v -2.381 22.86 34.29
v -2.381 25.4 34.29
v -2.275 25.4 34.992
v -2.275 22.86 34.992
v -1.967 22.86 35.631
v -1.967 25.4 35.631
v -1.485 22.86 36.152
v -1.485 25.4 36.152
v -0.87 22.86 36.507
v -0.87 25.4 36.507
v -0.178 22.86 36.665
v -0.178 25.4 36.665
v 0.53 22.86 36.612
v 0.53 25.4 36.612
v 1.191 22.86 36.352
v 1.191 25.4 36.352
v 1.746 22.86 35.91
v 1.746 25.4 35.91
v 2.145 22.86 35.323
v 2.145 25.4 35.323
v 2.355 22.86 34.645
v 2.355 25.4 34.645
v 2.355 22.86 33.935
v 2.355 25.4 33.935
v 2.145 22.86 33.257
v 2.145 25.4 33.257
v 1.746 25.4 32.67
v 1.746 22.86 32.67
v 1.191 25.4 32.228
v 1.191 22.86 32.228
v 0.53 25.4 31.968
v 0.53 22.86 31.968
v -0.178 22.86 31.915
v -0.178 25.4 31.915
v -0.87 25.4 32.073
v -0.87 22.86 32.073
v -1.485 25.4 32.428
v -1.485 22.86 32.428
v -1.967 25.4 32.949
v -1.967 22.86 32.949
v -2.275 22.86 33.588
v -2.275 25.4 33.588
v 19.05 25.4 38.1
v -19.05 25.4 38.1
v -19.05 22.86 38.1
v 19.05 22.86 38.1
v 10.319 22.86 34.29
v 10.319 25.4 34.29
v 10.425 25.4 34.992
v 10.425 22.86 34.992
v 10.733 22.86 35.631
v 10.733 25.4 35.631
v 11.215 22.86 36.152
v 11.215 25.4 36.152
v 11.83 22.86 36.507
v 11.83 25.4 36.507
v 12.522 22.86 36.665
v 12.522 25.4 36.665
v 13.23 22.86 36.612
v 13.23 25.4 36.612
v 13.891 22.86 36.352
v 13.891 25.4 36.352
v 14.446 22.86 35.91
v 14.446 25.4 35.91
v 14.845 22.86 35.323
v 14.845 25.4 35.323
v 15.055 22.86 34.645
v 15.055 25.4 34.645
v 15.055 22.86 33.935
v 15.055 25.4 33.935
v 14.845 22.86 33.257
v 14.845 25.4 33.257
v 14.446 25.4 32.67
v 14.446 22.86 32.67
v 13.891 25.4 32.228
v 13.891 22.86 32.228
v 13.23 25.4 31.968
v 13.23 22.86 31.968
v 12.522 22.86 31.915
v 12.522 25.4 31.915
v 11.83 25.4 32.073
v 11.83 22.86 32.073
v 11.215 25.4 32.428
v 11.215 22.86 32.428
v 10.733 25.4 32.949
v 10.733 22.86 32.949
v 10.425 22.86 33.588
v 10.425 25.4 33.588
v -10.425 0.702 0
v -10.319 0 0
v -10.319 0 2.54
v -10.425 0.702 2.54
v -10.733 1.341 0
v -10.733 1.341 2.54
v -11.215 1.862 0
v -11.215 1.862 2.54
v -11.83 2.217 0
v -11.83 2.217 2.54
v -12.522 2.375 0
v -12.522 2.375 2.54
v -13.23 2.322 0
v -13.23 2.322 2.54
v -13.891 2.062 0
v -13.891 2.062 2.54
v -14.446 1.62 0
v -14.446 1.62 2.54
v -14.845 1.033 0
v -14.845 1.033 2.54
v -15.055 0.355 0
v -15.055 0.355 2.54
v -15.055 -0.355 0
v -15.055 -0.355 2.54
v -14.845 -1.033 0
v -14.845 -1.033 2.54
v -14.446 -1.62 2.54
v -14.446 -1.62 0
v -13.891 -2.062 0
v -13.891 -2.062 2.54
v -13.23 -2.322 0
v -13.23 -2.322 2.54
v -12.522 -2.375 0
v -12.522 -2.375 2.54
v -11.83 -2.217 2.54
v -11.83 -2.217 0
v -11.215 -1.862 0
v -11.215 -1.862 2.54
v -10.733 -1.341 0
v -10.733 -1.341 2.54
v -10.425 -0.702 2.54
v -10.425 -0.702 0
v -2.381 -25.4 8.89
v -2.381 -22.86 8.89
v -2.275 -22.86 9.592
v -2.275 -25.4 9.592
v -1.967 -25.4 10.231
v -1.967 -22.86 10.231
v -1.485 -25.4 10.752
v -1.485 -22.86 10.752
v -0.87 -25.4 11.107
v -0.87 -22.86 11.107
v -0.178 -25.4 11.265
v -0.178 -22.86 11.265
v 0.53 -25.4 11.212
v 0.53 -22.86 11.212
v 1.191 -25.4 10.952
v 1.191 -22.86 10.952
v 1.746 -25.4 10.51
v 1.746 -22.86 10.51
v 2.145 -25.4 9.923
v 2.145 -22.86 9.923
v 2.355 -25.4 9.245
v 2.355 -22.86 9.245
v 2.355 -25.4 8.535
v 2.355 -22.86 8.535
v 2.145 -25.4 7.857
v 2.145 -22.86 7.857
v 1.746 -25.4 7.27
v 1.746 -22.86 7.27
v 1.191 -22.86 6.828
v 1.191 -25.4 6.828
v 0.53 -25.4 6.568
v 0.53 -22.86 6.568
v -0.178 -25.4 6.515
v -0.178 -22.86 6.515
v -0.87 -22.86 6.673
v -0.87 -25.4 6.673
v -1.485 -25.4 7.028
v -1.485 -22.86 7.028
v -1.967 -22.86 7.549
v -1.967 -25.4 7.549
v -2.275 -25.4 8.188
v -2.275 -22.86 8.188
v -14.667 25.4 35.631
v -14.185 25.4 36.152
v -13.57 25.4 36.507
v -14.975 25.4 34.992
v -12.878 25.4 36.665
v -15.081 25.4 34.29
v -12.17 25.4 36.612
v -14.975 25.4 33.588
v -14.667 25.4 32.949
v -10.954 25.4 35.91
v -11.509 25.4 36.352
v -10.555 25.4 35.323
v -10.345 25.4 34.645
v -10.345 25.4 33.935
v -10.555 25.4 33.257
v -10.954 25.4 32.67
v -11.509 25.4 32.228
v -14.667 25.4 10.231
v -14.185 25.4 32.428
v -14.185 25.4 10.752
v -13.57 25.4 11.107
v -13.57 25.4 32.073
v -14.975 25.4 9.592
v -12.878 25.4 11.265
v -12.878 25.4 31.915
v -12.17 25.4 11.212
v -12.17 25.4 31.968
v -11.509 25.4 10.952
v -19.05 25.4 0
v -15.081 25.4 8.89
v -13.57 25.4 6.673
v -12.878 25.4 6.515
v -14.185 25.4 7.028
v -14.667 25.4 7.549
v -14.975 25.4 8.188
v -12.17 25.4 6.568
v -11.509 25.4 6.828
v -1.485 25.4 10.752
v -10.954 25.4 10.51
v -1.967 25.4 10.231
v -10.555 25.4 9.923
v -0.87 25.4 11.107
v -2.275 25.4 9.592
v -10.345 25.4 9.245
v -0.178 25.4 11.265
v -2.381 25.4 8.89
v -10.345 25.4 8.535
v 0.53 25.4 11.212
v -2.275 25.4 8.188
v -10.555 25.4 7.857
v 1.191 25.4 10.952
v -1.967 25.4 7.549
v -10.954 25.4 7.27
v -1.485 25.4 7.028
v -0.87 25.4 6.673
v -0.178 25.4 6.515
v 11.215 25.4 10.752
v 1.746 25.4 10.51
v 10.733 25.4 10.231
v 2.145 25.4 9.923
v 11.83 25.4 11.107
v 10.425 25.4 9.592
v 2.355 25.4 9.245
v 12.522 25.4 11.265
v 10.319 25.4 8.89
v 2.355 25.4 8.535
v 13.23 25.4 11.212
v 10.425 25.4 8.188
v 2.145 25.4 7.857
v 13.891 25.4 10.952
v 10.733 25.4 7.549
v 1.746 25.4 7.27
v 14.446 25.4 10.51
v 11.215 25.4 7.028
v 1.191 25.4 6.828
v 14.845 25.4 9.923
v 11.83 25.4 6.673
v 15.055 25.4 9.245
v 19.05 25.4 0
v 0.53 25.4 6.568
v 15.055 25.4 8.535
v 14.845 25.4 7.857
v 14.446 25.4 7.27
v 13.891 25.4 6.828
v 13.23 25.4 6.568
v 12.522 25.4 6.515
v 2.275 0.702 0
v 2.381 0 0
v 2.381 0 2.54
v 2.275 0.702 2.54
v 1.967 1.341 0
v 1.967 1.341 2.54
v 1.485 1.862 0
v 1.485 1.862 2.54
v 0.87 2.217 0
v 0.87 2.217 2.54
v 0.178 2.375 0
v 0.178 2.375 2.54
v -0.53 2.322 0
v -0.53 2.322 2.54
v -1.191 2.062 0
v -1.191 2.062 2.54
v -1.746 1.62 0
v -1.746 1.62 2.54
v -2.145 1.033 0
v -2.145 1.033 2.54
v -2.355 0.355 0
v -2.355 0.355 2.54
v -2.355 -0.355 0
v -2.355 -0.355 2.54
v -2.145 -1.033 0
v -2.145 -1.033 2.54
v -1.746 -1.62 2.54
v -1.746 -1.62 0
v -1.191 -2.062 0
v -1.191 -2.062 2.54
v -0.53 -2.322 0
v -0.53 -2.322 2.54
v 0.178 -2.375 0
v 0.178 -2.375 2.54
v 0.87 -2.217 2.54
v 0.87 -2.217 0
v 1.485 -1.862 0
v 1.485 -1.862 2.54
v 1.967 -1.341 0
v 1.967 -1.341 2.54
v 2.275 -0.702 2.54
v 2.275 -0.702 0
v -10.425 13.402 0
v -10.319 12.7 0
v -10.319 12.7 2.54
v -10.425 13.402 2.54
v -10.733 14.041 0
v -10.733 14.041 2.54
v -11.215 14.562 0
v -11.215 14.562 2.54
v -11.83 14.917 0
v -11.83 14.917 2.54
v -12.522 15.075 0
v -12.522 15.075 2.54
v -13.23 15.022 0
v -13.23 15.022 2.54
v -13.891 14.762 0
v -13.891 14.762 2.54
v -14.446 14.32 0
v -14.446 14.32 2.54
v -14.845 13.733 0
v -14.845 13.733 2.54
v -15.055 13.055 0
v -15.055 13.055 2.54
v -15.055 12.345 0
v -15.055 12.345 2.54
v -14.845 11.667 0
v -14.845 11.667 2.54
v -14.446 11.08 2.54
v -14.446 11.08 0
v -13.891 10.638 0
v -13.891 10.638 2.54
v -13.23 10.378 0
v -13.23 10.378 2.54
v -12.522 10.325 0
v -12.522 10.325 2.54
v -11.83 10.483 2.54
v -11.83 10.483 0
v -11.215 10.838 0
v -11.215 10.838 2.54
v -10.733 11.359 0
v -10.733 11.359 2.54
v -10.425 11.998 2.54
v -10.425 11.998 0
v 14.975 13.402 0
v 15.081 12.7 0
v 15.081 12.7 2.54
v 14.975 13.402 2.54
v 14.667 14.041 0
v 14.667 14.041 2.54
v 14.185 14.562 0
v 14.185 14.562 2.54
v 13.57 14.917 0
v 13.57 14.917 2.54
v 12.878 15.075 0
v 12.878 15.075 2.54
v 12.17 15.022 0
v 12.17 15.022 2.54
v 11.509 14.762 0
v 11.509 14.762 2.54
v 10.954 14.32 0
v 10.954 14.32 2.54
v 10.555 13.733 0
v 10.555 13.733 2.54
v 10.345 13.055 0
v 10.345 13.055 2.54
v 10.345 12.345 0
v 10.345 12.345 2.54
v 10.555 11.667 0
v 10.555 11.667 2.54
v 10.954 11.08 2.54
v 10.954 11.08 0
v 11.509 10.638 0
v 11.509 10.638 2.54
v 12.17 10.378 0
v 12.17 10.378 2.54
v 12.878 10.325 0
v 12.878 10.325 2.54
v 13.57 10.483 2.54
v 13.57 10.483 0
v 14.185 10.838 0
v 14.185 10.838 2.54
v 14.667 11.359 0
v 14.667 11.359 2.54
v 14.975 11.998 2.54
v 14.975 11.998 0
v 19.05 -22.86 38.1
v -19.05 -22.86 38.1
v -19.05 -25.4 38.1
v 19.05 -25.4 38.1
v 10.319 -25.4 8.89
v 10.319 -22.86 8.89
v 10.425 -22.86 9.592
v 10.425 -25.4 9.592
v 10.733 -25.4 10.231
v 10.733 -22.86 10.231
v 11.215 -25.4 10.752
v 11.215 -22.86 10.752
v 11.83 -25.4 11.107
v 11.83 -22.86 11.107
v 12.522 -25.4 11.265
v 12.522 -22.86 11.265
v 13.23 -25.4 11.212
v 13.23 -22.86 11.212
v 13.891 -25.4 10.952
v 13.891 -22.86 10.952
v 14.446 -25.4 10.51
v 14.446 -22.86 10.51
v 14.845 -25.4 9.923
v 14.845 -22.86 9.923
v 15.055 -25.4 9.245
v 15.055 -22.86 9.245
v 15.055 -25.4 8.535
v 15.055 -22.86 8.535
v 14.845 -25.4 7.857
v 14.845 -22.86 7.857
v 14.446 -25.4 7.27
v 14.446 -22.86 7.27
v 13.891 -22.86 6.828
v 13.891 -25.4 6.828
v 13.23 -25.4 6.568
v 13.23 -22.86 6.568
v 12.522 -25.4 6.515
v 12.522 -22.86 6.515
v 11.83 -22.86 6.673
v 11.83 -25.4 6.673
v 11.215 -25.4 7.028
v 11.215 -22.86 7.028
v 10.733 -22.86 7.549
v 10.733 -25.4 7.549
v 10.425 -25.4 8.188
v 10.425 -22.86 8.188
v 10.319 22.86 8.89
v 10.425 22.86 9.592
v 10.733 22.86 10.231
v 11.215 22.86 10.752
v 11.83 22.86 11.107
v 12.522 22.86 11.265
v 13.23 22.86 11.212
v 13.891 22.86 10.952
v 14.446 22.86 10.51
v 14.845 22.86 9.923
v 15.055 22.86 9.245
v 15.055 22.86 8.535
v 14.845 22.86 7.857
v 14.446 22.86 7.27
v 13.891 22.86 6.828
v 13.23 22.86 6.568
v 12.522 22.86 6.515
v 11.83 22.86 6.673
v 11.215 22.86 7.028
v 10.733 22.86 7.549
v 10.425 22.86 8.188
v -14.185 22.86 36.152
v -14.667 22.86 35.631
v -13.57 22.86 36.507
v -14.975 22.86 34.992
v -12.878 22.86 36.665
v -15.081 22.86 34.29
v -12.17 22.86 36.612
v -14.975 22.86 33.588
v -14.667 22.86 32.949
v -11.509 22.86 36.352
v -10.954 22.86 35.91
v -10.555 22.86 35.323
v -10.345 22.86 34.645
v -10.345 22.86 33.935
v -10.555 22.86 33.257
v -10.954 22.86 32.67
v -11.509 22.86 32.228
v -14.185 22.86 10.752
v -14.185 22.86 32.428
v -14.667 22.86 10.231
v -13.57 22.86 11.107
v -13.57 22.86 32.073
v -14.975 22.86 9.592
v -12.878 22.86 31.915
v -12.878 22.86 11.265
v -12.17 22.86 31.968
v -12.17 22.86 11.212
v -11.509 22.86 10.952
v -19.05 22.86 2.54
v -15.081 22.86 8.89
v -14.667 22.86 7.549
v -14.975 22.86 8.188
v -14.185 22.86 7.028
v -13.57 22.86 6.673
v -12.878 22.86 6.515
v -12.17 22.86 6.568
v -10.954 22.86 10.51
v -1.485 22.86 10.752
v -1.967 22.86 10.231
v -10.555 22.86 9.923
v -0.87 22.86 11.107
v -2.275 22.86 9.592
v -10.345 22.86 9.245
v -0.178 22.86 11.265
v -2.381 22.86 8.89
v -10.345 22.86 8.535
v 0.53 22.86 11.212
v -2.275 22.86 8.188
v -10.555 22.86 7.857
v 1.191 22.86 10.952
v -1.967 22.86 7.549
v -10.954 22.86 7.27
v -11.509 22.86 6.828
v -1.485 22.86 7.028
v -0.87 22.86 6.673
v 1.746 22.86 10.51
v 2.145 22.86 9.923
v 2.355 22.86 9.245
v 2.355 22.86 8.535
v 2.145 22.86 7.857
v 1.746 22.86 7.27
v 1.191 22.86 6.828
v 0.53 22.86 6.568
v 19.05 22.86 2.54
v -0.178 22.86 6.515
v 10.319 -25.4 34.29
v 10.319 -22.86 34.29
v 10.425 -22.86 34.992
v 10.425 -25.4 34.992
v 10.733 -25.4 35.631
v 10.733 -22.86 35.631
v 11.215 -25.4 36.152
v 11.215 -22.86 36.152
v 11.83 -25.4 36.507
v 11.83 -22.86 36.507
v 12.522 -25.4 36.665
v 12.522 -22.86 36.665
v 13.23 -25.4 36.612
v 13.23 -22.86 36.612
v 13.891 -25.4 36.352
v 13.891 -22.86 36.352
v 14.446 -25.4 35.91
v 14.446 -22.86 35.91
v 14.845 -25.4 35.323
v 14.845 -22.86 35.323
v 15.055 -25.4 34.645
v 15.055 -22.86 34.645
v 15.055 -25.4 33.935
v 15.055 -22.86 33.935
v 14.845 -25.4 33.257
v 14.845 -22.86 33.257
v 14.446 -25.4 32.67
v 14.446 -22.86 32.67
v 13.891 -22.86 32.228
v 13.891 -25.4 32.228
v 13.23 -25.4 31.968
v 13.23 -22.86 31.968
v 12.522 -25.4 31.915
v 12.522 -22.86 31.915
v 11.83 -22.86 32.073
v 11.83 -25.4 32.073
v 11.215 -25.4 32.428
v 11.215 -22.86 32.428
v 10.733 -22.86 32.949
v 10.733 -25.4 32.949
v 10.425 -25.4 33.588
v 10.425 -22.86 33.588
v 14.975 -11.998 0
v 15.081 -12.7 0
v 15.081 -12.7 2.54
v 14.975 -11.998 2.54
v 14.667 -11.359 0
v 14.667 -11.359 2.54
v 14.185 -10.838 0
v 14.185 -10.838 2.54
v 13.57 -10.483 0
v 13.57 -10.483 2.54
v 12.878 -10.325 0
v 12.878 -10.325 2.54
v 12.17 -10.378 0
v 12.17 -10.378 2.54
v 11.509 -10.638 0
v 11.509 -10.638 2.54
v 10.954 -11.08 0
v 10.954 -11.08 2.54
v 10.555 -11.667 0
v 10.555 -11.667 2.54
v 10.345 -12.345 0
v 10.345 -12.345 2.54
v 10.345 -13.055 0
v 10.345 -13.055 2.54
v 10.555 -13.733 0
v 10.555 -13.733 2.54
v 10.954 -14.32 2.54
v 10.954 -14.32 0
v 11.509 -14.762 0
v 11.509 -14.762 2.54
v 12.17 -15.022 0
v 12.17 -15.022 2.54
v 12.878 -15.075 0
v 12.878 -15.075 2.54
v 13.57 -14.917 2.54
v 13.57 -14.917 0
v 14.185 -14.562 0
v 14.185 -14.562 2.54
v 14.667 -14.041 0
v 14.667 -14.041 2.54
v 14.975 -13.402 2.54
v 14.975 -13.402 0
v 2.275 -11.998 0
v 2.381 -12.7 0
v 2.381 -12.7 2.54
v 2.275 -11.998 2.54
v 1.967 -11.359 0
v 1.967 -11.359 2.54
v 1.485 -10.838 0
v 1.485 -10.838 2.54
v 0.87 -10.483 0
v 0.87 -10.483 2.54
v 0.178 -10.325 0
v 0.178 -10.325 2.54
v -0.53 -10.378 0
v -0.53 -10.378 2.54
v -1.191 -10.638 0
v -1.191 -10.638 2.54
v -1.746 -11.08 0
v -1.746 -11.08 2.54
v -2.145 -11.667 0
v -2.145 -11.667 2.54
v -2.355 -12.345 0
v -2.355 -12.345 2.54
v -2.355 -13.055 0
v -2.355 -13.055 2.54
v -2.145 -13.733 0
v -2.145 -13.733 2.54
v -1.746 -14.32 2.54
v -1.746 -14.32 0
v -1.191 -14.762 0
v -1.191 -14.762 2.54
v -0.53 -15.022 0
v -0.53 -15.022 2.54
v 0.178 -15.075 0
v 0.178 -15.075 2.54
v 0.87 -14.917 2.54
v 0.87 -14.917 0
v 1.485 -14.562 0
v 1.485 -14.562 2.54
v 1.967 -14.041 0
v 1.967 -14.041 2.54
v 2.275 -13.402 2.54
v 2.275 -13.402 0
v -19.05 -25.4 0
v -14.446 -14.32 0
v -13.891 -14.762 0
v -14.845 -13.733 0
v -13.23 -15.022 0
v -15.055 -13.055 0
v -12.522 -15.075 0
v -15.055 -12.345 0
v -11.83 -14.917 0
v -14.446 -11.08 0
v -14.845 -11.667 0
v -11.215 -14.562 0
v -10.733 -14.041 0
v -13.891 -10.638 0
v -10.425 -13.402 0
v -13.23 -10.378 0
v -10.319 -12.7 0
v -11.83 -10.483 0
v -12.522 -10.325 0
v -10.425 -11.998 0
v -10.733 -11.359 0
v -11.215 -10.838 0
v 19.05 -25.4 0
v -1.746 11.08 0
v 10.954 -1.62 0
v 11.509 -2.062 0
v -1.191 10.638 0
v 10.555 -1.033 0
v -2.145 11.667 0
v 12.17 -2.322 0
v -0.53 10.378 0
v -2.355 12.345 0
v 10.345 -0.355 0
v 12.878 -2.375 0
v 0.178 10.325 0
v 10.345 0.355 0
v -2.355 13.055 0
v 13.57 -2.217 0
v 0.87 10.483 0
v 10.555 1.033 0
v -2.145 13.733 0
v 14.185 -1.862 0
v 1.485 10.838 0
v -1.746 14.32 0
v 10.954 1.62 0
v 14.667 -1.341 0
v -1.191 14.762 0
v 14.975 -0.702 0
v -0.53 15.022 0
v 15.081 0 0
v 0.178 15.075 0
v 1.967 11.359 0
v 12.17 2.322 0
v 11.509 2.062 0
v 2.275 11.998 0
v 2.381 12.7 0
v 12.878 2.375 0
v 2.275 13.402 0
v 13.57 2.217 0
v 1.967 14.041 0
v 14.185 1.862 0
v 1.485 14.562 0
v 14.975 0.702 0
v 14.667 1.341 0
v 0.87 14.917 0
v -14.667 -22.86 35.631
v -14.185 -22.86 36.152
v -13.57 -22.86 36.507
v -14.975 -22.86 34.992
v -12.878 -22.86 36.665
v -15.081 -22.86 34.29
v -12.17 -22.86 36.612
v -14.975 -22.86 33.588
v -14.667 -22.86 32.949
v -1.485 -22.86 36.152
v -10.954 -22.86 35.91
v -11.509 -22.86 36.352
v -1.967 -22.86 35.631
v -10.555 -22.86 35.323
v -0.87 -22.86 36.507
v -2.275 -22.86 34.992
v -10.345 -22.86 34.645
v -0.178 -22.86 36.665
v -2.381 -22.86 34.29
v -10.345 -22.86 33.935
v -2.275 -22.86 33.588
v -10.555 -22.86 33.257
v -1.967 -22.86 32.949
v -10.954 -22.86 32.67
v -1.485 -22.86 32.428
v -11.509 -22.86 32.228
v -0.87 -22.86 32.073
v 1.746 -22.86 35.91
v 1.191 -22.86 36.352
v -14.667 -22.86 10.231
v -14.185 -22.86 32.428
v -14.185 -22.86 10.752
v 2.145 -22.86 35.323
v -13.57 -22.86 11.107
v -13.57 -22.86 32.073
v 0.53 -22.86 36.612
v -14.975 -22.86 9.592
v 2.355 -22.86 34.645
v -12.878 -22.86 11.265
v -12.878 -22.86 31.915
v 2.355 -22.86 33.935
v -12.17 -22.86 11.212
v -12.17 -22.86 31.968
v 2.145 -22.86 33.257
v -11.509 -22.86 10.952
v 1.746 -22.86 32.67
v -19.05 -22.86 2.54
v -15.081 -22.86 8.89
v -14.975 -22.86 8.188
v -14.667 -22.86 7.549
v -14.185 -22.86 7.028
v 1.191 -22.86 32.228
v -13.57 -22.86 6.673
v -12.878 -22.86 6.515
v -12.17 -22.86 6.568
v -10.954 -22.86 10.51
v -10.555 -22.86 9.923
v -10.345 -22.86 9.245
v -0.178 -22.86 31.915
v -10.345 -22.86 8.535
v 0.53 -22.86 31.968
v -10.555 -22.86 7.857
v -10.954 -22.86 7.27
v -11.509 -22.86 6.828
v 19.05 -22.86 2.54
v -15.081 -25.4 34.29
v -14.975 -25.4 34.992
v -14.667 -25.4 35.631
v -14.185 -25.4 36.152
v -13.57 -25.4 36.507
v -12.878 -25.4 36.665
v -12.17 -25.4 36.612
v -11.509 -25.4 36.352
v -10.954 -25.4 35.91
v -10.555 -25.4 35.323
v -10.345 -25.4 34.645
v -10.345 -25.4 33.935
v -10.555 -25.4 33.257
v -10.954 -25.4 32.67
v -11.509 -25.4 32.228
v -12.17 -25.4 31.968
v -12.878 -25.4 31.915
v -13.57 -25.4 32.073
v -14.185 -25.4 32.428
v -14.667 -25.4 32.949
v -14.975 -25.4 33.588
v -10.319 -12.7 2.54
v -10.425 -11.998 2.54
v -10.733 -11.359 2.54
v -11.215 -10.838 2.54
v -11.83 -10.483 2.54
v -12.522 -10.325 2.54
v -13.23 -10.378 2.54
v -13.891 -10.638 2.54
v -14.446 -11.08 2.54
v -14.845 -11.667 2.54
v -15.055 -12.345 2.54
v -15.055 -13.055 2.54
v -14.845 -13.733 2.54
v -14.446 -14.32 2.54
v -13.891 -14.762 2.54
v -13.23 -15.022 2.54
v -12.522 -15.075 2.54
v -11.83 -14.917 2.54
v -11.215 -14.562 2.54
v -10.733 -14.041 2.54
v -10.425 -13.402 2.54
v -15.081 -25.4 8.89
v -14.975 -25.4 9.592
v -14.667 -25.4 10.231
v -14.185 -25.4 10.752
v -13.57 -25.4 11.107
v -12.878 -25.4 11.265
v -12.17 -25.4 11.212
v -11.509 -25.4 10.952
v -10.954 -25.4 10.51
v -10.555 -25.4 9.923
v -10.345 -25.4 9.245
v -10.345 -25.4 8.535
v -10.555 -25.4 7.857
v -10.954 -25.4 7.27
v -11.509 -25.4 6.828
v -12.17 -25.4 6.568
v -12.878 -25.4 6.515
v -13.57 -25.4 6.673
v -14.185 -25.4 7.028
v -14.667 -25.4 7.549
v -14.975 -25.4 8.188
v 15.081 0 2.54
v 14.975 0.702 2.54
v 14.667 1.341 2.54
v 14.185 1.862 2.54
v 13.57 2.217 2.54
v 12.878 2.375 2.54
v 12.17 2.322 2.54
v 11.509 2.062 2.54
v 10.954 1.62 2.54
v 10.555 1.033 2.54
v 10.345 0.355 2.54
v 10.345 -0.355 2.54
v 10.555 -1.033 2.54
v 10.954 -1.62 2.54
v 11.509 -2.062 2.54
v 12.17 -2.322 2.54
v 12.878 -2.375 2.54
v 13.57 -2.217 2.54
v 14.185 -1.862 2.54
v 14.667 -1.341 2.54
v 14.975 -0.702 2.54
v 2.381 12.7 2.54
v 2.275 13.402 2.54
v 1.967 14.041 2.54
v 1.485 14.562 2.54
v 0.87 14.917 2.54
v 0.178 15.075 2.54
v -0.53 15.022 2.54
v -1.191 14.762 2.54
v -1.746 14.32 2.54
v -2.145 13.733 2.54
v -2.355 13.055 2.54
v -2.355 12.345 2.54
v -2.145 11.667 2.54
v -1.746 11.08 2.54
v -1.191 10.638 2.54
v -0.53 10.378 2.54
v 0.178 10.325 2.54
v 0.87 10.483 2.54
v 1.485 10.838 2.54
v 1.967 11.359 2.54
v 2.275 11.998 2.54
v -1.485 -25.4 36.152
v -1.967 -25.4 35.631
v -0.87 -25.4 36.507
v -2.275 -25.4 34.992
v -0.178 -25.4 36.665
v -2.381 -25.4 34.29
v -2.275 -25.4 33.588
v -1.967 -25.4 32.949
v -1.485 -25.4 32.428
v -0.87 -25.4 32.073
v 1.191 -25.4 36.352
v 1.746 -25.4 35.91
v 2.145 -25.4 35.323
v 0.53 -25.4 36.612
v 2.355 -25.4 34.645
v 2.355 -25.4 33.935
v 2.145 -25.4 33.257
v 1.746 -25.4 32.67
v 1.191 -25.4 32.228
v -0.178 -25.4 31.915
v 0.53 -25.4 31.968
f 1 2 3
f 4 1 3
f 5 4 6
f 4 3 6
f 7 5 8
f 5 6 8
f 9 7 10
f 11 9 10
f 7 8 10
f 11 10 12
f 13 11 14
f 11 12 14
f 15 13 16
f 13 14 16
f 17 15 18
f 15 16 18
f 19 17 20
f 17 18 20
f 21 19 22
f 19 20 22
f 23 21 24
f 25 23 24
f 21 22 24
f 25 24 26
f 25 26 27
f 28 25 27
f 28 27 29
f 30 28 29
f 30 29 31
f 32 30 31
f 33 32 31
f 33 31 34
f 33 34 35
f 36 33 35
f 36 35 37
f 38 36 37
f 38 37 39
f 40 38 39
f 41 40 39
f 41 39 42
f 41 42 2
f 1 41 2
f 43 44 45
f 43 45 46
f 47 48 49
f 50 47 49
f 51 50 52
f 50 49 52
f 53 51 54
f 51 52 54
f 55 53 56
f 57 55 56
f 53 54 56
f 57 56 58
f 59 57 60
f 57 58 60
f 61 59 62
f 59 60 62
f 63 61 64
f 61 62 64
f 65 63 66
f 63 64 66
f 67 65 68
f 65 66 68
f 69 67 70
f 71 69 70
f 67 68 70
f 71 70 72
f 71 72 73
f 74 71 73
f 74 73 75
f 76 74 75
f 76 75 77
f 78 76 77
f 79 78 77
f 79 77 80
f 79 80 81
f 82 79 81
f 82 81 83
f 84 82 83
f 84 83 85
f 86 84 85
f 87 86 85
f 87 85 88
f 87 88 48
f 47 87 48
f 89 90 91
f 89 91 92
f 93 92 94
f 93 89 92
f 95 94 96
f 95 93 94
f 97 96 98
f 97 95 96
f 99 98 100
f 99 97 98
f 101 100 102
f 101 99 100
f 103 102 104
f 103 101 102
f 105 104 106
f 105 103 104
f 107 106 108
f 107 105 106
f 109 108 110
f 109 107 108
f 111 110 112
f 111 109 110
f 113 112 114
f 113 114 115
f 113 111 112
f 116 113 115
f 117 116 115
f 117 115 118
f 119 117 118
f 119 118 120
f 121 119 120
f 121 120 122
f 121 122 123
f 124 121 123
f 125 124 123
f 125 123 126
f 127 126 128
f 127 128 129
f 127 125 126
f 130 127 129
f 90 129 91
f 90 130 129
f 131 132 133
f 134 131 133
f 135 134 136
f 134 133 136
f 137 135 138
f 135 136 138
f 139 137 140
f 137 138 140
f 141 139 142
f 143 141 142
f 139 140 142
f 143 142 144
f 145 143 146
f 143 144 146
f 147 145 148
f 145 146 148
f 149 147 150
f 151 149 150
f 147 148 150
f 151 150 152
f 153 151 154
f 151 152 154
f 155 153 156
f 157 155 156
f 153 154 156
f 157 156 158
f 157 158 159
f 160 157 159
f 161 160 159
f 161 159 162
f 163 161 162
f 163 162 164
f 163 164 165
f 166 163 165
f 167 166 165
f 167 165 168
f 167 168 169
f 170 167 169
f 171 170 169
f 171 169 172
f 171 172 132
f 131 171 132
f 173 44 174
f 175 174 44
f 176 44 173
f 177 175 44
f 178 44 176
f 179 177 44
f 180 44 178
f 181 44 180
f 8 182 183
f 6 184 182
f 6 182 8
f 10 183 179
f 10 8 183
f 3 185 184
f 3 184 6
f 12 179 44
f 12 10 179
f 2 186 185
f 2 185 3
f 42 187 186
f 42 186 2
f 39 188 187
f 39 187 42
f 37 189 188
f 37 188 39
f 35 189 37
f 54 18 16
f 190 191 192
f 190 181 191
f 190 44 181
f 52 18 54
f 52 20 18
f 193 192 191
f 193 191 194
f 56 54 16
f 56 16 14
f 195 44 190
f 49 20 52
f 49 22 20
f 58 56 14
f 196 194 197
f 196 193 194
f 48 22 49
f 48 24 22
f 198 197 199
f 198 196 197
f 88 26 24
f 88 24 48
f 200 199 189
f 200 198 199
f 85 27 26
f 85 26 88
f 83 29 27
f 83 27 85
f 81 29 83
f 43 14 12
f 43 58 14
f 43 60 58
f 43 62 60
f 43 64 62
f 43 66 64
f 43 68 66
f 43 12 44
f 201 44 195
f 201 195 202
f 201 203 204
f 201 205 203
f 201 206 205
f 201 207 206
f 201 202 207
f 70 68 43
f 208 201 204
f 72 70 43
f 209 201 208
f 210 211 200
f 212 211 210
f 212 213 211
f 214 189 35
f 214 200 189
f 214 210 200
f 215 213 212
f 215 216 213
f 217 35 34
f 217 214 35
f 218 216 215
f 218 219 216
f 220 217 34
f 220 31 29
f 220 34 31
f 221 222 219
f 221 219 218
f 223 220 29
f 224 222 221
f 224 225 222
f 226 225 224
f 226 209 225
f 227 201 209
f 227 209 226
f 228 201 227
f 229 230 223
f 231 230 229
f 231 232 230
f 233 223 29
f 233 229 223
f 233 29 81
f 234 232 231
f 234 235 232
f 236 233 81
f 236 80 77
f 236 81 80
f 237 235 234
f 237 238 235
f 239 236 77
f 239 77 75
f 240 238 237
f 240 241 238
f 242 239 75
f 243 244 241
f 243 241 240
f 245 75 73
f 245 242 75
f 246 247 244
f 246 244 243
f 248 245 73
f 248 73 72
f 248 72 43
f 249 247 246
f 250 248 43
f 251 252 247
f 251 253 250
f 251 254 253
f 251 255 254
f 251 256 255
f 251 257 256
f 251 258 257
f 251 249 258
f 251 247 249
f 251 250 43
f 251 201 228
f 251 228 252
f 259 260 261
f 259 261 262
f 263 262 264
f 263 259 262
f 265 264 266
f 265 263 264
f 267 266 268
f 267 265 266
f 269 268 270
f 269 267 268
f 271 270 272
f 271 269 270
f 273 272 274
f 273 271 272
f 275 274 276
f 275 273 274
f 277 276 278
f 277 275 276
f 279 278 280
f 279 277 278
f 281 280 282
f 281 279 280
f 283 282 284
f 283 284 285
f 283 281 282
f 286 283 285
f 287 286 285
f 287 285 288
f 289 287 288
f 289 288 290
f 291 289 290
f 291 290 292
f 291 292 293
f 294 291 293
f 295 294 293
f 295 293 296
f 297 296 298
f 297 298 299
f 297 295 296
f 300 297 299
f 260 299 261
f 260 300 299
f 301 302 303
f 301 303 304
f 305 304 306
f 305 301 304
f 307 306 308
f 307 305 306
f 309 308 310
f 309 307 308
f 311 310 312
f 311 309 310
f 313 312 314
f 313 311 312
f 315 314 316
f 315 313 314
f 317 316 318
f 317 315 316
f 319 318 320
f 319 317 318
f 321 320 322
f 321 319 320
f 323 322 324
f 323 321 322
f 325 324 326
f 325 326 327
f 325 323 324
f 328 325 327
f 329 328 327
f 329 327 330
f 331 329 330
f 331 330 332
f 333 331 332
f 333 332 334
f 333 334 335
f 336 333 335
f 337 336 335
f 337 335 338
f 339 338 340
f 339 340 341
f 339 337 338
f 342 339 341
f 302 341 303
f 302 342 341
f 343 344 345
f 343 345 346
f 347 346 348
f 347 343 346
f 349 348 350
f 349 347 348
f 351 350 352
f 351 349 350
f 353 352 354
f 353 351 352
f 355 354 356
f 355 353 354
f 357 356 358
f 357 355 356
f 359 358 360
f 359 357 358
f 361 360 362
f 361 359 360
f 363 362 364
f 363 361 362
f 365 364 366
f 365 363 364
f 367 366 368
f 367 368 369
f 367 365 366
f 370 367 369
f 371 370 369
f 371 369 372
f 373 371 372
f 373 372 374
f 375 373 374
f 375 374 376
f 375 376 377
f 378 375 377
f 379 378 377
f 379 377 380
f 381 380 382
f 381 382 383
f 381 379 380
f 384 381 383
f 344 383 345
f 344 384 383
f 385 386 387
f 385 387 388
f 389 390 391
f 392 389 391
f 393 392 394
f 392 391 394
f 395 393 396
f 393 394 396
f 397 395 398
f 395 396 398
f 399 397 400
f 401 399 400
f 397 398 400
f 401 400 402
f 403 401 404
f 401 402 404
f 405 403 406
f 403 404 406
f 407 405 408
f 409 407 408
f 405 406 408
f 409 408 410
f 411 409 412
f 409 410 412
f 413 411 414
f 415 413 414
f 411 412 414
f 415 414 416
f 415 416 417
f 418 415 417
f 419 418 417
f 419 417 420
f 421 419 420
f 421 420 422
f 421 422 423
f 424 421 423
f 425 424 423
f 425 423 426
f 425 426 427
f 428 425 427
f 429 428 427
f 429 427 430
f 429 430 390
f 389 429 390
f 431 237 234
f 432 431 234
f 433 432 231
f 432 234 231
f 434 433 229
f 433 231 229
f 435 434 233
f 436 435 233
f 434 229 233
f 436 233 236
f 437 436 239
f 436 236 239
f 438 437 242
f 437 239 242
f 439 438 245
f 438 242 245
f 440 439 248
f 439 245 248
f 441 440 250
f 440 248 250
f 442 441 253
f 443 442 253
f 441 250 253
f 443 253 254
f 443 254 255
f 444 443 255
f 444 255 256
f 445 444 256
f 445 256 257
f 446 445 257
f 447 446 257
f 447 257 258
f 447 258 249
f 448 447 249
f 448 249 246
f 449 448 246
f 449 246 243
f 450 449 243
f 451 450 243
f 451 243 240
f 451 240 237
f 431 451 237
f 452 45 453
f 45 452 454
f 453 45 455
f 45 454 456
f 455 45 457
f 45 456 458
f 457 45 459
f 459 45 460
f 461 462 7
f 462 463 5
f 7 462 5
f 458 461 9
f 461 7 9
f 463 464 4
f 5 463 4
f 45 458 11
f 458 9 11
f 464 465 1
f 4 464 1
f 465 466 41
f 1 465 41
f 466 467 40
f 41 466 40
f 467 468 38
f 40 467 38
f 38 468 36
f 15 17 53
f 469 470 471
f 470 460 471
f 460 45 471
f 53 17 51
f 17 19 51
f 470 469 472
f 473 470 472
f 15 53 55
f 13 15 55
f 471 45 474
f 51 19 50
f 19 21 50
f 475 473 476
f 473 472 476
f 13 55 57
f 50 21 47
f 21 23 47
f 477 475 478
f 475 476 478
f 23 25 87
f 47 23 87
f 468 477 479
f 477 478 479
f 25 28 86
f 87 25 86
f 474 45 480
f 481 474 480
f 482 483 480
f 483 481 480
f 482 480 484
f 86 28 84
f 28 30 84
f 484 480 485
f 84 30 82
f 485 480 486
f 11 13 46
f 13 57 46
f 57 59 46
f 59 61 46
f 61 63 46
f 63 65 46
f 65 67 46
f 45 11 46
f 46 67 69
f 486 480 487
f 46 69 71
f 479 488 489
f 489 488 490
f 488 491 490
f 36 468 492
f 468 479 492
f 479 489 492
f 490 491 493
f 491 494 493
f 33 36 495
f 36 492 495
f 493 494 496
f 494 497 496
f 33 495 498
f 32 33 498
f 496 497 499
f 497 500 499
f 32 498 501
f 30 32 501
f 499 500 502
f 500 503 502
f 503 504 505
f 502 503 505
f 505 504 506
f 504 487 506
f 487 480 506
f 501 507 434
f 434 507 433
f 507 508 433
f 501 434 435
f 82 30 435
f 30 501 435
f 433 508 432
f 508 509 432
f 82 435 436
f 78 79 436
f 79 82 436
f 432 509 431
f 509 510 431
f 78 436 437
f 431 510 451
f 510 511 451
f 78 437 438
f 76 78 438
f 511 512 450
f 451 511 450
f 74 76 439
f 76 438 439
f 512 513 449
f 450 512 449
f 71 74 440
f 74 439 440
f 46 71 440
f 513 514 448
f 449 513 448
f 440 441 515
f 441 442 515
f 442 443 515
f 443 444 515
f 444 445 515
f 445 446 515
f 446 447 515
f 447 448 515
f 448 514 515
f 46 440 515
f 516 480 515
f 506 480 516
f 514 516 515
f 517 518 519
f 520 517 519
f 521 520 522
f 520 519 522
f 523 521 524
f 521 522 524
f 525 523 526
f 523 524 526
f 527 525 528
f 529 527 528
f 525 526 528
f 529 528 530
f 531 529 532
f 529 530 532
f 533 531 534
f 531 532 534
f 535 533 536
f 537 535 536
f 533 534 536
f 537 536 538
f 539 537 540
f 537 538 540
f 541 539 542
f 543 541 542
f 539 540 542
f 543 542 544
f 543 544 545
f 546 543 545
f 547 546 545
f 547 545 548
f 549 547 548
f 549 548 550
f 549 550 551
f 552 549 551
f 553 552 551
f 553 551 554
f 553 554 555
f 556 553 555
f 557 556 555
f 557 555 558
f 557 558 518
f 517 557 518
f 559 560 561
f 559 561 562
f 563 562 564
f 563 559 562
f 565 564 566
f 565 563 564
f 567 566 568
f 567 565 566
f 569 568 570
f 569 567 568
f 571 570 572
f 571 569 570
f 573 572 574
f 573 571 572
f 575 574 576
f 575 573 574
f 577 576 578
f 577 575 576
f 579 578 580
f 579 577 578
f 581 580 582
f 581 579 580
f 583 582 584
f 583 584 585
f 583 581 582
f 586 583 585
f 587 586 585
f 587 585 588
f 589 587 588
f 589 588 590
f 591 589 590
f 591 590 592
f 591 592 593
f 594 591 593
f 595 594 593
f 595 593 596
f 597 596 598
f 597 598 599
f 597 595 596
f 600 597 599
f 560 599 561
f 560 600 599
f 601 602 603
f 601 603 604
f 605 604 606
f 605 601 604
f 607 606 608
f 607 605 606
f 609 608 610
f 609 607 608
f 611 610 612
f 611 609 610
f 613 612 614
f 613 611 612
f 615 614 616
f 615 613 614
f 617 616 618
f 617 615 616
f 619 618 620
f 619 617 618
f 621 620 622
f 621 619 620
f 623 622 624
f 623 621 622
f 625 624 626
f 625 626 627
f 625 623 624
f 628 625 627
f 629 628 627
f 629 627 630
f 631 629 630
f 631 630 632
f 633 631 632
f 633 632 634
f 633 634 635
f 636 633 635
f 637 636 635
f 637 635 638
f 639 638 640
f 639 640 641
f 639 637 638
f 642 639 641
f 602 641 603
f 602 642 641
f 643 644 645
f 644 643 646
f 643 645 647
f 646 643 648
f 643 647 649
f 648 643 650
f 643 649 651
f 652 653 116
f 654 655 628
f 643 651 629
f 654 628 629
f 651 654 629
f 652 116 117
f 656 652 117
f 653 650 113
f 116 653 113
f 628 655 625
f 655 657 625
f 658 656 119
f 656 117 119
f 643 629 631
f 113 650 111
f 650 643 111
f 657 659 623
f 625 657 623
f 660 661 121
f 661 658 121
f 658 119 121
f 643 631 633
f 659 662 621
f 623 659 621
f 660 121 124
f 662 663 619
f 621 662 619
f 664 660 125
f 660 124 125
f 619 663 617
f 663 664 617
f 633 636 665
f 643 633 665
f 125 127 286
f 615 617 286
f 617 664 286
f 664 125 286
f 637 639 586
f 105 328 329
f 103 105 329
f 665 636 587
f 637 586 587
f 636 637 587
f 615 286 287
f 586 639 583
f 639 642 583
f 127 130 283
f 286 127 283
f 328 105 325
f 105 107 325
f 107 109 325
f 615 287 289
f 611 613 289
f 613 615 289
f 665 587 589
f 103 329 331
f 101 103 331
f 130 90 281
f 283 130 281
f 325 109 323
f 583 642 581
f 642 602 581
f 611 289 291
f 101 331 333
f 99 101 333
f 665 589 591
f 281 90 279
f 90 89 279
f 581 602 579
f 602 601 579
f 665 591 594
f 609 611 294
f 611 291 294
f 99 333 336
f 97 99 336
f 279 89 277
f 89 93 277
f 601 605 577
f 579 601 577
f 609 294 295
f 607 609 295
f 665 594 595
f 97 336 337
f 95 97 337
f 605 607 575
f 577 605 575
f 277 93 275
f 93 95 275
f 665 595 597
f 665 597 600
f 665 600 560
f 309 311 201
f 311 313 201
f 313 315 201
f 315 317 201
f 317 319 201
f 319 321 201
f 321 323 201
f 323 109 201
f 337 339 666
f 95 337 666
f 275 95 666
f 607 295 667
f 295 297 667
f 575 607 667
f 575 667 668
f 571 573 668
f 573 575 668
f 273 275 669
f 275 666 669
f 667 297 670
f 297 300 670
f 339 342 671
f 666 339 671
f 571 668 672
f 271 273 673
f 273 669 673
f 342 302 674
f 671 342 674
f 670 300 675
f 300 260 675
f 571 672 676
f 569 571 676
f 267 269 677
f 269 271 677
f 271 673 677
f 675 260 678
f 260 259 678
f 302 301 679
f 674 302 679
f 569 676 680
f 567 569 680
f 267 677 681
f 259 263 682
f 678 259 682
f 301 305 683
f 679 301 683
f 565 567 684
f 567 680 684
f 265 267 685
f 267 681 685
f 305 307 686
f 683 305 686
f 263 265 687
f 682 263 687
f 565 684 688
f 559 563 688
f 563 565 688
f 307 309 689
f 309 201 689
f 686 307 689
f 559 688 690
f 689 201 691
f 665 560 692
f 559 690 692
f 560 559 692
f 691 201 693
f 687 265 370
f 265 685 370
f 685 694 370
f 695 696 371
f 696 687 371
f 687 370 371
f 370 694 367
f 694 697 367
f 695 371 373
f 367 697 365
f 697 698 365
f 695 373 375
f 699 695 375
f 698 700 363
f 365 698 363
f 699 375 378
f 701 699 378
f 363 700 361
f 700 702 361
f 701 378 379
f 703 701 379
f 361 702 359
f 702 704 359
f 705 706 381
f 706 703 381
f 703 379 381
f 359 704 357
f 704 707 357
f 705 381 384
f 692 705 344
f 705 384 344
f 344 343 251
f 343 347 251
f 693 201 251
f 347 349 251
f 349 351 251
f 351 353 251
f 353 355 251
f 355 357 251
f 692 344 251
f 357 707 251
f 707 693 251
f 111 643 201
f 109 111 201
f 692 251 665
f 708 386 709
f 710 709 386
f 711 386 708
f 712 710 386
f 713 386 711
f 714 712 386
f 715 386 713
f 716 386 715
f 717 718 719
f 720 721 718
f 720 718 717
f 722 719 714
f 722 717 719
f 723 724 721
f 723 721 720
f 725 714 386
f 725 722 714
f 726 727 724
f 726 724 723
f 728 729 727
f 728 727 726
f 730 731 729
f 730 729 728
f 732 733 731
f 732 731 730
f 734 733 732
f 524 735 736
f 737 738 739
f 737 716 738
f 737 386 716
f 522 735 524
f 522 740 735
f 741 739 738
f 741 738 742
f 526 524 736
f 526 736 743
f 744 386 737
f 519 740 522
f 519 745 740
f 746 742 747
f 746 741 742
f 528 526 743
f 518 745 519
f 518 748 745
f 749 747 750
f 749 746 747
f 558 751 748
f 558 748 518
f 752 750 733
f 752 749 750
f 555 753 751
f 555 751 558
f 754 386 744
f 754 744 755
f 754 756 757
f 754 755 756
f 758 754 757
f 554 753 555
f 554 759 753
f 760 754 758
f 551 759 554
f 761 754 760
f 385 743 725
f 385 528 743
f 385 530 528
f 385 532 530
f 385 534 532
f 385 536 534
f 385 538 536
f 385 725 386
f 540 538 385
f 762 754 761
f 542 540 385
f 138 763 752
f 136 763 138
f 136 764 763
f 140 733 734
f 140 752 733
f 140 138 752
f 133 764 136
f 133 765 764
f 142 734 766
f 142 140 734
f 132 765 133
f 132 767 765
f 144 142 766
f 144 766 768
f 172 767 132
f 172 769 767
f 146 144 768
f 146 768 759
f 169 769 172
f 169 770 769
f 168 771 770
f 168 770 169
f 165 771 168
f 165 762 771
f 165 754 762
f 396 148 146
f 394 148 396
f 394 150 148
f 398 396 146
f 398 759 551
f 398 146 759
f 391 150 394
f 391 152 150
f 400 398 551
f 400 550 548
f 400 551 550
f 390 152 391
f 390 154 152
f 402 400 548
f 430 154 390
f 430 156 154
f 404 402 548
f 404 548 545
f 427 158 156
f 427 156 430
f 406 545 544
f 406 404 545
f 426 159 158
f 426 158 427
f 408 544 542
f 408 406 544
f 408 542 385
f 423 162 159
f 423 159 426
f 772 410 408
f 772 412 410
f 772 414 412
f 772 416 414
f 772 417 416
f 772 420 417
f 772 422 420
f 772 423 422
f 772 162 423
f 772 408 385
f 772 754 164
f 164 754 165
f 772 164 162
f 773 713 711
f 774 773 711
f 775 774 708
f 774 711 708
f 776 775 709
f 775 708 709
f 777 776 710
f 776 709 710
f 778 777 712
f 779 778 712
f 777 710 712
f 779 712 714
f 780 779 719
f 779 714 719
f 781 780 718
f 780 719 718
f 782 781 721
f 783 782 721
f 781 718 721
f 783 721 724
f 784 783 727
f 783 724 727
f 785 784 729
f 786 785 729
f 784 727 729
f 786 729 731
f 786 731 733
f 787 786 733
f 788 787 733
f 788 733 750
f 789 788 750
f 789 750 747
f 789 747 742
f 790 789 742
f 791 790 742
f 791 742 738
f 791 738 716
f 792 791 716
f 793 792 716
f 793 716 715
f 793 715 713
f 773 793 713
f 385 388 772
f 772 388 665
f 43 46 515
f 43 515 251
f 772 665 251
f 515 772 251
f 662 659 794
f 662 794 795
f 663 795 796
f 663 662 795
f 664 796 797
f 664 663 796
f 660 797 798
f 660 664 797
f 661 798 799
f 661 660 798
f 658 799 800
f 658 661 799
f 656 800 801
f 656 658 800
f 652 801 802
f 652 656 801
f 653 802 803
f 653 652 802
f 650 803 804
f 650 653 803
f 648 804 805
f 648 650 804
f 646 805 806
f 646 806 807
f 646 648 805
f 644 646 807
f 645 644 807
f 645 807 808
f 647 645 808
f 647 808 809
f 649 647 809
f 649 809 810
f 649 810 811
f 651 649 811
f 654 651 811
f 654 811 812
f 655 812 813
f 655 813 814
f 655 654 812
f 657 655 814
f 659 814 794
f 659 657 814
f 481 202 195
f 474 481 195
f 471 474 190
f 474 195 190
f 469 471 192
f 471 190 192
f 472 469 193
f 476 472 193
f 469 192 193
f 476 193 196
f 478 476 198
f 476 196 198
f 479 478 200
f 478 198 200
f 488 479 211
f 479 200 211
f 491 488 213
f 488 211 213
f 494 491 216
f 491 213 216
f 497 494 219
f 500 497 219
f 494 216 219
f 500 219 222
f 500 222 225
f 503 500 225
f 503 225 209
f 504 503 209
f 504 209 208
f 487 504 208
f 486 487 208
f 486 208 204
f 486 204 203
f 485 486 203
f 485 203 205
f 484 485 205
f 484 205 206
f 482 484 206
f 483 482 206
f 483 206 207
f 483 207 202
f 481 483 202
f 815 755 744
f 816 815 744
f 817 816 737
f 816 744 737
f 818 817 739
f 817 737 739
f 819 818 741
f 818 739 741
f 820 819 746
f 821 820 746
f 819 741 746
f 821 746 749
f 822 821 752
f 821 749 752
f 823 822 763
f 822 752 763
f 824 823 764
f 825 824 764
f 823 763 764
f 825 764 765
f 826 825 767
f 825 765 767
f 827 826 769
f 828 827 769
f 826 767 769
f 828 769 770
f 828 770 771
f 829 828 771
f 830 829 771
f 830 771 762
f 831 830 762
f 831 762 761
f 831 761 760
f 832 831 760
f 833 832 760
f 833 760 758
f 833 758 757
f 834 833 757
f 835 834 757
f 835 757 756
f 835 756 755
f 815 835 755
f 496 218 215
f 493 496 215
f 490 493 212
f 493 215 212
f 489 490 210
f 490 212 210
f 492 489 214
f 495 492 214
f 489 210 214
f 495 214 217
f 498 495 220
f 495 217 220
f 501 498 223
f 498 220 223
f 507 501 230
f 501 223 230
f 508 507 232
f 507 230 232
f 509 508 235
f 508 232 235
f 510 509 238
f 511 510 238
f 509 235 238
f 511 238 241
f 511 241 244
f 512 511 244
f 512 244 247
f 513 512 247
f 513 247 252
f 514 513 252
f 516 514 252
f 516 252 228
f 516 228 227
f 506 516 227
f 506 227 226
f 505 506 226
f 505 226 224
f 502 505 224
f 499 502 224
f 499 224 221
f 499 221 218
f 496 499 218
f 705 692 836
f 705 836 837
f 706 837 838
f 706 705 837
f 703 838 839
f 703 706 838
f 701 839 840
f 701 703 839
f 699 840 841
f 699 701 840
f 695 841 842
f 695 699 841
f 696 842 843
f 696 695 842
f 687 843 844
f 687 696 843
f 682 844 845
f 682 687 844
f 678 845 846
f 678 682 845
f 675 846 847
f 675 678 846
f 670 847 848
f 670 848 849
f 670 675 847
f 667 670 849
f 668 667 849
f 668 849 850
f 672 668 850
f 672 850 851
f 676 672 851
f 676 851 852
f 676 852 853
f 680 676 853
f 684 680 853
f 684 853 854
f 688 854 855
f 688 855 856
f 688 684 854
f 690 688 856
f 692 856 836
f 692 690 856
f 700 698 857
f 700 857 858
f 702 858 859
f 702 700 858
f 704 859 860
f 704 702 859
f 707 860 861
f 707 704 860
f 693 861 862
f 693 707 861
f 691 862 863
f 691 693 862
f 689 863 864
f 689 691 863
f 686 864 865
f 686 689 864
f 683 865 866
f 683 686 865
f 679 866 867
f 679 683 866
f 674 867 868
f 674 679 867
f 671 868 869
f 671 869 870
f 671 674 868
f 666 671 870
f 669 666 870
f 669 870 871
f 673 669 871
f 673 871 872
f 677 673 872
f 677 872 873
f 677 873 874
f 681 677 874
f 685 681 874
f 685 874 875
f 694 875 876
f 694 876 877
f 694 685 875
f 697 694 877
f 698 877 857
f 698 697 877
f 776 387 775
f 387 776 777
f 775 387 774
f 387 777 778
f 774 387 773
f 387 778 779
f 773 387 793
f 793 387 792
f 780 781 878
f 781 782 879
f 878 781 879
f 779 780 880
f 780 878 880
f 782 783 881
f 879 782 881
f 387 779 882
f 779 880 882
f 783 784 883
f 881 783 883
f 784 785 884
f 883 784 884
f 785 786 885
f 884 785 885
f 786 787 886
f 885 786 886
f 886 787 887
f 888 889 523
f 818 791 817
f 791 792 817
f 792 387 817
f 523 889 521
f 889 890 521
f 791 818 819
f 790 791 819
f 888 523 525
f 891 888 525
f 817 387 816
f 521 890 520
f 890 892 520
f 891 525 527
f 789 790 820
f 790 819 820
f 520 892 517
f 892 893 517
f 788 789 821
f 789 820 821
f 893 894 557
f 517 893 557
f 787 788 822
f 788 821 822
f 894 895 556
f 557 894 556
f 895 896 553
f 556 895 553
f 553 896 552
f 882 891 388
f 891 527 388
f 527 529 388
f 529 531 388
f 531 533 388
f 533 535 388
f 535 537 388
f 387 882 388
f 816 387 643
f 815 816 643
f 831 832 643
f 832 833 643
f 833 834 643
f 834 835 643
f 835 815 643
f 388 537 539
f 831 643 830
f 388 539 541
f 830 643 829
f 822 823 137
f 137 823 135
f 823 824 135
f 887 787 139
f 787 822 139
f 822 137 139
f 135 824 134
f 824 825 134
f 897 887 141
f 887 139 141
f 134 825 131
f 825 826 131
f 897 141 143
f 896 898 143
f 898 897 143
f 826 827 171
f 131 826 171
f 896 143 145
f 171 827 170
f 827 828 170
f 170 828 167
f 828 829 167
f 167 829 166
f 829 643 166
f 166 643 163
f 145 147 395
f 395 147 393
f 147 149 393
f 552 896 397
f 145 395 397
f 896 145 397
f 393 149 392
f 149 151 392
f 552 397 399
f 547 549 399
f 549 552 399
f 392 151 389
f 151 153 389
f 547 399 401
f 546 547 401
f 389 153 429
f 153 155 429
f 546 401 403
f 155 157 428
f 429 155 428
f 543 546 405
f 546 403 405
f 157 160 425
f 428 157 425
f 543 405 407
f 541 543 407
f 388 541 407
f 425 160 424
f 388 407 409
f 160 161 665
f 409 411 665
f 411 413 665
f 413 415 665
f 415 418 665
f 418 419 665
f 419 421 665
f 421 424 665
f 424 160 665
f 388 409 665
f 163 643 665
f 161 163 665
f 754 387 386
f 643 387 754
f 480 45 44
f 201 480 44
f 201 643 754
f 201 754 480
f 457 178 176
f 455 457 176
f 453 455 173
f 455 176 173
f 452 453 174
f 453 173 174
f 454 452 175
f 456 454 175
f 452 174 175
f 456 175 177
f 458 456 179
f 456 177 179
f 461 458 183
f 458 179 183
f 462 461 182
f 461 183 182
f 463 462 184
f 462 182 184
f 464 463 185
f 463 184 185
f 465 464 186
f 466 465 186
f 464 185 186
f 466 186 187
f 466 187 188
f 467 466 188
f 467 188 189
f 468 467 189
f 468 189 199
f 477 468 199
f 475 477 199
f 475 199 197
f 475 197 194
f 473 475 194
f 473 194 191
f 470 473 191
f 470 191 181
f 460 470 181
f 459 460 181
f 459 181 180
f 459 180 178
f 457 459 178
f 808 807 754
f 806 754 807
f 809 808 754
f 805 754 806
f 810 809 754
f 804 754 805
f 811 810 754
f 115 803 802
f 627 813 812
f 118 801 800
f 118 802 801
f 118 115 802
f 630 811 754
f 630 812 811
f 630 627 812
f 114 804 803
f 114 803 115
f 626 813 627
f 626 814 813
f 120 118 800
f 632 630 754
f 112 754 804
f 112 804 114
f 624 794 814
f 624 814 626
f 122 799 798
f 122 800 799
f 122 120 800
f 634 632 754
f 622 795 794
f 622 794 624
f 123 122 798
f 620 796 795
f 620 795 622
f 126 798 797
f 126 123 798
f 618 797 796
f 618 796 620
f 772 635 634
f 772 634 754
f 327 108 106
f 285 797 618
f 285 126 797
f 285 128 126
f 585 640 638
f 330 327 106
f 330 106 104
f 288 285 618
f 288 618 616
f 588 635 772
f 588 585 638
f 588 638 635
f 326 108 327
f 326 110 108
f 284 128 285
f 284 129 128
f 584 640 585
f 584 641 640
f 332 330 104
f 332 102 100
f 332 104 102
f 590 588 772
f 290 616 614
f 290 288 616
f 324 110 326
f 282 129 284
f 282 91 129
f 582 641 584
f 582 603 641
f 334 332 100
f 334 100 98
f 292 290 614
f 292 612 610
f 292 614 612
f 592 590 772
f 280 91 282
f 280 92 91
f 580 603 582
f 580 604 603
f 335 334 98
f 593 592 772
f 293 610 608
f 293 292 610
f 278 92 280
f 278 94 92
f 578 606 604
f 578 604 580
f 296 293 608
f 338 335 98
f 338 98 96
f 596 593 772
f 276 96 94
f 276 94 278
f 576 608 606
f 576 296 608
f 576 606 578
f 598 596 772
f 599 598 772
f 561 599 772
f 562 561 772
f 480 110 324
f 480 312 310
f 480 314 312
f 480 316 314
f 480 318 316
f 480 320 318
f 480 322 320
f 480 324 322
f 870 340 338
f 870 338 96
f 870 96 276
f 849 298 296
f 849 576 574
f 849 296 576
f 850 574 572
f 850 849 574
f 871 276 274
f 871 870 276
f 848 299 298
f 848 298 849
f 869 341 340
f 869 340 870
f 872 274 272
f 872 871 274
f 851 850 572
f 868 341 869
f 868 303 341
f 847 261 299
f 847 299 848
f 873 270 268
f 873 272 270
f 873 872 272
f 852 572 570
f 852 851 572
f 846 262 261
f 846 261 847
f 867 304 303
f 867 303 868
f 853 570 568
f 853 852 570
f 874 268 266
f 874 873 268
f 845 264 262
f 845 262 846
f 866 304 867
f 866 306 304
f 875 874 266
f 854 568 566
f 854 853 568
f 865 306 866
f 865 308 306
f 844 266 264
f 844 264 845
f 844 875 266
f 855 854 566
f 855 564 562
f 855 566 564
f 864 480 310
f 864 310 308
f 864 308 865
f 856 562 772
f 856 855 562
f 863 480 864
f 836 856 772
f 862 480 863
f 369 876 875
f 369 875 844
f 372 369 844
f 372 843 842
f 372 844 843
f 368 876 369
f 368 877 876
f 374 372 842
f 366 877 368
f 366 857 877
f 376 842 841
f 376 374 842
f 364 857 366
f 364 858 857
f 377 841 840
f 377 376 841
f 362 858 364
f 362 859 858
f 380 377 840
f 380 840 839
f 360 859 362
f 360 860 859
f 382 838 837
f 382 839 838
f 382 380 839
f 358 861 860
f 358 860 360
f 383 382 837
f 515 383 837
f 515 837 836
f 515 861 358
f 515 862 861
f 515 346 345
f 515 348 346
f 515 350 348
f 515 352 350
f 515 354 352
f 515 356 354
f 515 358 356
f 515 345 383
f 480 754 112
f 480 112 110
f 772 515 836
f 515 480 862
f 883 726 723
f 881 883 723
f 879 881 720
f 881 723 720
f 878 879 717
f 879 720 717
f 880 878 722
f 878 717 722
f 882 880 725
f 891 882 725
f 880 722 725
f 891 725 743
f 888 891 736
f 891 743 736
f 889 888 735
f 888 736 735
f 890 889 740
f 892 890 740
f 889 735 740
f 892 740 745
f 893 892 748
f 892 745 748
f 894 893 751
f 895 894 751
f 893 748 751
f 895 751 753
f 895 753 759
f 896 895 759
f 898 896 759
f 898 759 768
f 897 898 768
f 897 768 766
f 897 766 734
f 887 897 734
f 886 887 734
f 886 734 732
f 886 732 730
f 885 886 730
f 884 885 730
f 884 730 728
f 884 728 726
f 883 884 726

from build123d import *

# Parameters (mm, degrees)
F0_W     = 38.1
F0_H     = 45.72
F0_R     = 2.38125
F1_DEPTH = 2.54
F0_H_2   = 2.54
F2_DEPTH = 38.1
F3_R     = 2.38125
F4_DEPTH = 50.801


with BuildPart() as f1:
    # F0 (on Top) → F1 (new body)
    with BuildSketch(Plane.XY):
        Rectangle(F0_W, F0_H)
        with Locations((-12.7, -12.7)):
            Circle(F0_R, mode=Mode.SUBTRACT)
        with Locations((-12.7, 0)):
            Circle(F0_R, mode=Mode.SUBTRACT)
        with Locations((0, -12.7)):
            Circle(F0_R, mode=Mode.SUBTRACT)
        with Locations((12.7, -12.7)):
            Circle(F0_R, mode=Mode.SUBTRACT)
        Circle(F0_R, mode=Mode.SUBTRACT)
        with Locations((12.7, 0)):
            Circle(F0_R, mode=Mode.SUBTRACT)
        with Locations((-12.7, 12.7)):
            Circle(F0_R, mode=Mode.SUBTRACT)
        with Locations((0, 12.7)):
            Circle(F0_R, mode=Mode.SUBTRACT)
        with Locations((12.7, 12.7)):
            Circle(F0_R, mode=Mode.SUBTRACT)
    extrude(amount=F1_DEPTH)

    # F0 (on Top) → F2 (join)
    with BuildSketch(Plane.XY):
        with Locations((0, 24.13)):
            Rectangle(F0_W, F0_H_2)
        with Locations((0, -24.13)):
            Rectangle(F0_W, F0_H_2)
    extrude(amount=F2_DEPTH)

    # F3 (on face) → F4 (cut, through all)
    with BuildSketch(Plane(origin=(0, 25.4, 0), x_dir=(-1, 0, 0), z_dir=(0, 1, 0))):
        with Locations((-12.7, 34.29)):
            Circle(F3_R)
        with Locations((0, 34.29)):
            Circle(F3_R)
        with Locations((12.7, 34.29)):
            Circle(F3_R)
        with Locations((12.7, 8.89)):
            Circle(F3_R)
        with Locations((0, 8.89)):
            Circle(F3_R)
        with Locations((-12.7, 8.89)):
            Circle(F3_R)
    extrude(amount=-F4_DEPTH, mode=Mode.SUBTRACT)


solid = f1.part
